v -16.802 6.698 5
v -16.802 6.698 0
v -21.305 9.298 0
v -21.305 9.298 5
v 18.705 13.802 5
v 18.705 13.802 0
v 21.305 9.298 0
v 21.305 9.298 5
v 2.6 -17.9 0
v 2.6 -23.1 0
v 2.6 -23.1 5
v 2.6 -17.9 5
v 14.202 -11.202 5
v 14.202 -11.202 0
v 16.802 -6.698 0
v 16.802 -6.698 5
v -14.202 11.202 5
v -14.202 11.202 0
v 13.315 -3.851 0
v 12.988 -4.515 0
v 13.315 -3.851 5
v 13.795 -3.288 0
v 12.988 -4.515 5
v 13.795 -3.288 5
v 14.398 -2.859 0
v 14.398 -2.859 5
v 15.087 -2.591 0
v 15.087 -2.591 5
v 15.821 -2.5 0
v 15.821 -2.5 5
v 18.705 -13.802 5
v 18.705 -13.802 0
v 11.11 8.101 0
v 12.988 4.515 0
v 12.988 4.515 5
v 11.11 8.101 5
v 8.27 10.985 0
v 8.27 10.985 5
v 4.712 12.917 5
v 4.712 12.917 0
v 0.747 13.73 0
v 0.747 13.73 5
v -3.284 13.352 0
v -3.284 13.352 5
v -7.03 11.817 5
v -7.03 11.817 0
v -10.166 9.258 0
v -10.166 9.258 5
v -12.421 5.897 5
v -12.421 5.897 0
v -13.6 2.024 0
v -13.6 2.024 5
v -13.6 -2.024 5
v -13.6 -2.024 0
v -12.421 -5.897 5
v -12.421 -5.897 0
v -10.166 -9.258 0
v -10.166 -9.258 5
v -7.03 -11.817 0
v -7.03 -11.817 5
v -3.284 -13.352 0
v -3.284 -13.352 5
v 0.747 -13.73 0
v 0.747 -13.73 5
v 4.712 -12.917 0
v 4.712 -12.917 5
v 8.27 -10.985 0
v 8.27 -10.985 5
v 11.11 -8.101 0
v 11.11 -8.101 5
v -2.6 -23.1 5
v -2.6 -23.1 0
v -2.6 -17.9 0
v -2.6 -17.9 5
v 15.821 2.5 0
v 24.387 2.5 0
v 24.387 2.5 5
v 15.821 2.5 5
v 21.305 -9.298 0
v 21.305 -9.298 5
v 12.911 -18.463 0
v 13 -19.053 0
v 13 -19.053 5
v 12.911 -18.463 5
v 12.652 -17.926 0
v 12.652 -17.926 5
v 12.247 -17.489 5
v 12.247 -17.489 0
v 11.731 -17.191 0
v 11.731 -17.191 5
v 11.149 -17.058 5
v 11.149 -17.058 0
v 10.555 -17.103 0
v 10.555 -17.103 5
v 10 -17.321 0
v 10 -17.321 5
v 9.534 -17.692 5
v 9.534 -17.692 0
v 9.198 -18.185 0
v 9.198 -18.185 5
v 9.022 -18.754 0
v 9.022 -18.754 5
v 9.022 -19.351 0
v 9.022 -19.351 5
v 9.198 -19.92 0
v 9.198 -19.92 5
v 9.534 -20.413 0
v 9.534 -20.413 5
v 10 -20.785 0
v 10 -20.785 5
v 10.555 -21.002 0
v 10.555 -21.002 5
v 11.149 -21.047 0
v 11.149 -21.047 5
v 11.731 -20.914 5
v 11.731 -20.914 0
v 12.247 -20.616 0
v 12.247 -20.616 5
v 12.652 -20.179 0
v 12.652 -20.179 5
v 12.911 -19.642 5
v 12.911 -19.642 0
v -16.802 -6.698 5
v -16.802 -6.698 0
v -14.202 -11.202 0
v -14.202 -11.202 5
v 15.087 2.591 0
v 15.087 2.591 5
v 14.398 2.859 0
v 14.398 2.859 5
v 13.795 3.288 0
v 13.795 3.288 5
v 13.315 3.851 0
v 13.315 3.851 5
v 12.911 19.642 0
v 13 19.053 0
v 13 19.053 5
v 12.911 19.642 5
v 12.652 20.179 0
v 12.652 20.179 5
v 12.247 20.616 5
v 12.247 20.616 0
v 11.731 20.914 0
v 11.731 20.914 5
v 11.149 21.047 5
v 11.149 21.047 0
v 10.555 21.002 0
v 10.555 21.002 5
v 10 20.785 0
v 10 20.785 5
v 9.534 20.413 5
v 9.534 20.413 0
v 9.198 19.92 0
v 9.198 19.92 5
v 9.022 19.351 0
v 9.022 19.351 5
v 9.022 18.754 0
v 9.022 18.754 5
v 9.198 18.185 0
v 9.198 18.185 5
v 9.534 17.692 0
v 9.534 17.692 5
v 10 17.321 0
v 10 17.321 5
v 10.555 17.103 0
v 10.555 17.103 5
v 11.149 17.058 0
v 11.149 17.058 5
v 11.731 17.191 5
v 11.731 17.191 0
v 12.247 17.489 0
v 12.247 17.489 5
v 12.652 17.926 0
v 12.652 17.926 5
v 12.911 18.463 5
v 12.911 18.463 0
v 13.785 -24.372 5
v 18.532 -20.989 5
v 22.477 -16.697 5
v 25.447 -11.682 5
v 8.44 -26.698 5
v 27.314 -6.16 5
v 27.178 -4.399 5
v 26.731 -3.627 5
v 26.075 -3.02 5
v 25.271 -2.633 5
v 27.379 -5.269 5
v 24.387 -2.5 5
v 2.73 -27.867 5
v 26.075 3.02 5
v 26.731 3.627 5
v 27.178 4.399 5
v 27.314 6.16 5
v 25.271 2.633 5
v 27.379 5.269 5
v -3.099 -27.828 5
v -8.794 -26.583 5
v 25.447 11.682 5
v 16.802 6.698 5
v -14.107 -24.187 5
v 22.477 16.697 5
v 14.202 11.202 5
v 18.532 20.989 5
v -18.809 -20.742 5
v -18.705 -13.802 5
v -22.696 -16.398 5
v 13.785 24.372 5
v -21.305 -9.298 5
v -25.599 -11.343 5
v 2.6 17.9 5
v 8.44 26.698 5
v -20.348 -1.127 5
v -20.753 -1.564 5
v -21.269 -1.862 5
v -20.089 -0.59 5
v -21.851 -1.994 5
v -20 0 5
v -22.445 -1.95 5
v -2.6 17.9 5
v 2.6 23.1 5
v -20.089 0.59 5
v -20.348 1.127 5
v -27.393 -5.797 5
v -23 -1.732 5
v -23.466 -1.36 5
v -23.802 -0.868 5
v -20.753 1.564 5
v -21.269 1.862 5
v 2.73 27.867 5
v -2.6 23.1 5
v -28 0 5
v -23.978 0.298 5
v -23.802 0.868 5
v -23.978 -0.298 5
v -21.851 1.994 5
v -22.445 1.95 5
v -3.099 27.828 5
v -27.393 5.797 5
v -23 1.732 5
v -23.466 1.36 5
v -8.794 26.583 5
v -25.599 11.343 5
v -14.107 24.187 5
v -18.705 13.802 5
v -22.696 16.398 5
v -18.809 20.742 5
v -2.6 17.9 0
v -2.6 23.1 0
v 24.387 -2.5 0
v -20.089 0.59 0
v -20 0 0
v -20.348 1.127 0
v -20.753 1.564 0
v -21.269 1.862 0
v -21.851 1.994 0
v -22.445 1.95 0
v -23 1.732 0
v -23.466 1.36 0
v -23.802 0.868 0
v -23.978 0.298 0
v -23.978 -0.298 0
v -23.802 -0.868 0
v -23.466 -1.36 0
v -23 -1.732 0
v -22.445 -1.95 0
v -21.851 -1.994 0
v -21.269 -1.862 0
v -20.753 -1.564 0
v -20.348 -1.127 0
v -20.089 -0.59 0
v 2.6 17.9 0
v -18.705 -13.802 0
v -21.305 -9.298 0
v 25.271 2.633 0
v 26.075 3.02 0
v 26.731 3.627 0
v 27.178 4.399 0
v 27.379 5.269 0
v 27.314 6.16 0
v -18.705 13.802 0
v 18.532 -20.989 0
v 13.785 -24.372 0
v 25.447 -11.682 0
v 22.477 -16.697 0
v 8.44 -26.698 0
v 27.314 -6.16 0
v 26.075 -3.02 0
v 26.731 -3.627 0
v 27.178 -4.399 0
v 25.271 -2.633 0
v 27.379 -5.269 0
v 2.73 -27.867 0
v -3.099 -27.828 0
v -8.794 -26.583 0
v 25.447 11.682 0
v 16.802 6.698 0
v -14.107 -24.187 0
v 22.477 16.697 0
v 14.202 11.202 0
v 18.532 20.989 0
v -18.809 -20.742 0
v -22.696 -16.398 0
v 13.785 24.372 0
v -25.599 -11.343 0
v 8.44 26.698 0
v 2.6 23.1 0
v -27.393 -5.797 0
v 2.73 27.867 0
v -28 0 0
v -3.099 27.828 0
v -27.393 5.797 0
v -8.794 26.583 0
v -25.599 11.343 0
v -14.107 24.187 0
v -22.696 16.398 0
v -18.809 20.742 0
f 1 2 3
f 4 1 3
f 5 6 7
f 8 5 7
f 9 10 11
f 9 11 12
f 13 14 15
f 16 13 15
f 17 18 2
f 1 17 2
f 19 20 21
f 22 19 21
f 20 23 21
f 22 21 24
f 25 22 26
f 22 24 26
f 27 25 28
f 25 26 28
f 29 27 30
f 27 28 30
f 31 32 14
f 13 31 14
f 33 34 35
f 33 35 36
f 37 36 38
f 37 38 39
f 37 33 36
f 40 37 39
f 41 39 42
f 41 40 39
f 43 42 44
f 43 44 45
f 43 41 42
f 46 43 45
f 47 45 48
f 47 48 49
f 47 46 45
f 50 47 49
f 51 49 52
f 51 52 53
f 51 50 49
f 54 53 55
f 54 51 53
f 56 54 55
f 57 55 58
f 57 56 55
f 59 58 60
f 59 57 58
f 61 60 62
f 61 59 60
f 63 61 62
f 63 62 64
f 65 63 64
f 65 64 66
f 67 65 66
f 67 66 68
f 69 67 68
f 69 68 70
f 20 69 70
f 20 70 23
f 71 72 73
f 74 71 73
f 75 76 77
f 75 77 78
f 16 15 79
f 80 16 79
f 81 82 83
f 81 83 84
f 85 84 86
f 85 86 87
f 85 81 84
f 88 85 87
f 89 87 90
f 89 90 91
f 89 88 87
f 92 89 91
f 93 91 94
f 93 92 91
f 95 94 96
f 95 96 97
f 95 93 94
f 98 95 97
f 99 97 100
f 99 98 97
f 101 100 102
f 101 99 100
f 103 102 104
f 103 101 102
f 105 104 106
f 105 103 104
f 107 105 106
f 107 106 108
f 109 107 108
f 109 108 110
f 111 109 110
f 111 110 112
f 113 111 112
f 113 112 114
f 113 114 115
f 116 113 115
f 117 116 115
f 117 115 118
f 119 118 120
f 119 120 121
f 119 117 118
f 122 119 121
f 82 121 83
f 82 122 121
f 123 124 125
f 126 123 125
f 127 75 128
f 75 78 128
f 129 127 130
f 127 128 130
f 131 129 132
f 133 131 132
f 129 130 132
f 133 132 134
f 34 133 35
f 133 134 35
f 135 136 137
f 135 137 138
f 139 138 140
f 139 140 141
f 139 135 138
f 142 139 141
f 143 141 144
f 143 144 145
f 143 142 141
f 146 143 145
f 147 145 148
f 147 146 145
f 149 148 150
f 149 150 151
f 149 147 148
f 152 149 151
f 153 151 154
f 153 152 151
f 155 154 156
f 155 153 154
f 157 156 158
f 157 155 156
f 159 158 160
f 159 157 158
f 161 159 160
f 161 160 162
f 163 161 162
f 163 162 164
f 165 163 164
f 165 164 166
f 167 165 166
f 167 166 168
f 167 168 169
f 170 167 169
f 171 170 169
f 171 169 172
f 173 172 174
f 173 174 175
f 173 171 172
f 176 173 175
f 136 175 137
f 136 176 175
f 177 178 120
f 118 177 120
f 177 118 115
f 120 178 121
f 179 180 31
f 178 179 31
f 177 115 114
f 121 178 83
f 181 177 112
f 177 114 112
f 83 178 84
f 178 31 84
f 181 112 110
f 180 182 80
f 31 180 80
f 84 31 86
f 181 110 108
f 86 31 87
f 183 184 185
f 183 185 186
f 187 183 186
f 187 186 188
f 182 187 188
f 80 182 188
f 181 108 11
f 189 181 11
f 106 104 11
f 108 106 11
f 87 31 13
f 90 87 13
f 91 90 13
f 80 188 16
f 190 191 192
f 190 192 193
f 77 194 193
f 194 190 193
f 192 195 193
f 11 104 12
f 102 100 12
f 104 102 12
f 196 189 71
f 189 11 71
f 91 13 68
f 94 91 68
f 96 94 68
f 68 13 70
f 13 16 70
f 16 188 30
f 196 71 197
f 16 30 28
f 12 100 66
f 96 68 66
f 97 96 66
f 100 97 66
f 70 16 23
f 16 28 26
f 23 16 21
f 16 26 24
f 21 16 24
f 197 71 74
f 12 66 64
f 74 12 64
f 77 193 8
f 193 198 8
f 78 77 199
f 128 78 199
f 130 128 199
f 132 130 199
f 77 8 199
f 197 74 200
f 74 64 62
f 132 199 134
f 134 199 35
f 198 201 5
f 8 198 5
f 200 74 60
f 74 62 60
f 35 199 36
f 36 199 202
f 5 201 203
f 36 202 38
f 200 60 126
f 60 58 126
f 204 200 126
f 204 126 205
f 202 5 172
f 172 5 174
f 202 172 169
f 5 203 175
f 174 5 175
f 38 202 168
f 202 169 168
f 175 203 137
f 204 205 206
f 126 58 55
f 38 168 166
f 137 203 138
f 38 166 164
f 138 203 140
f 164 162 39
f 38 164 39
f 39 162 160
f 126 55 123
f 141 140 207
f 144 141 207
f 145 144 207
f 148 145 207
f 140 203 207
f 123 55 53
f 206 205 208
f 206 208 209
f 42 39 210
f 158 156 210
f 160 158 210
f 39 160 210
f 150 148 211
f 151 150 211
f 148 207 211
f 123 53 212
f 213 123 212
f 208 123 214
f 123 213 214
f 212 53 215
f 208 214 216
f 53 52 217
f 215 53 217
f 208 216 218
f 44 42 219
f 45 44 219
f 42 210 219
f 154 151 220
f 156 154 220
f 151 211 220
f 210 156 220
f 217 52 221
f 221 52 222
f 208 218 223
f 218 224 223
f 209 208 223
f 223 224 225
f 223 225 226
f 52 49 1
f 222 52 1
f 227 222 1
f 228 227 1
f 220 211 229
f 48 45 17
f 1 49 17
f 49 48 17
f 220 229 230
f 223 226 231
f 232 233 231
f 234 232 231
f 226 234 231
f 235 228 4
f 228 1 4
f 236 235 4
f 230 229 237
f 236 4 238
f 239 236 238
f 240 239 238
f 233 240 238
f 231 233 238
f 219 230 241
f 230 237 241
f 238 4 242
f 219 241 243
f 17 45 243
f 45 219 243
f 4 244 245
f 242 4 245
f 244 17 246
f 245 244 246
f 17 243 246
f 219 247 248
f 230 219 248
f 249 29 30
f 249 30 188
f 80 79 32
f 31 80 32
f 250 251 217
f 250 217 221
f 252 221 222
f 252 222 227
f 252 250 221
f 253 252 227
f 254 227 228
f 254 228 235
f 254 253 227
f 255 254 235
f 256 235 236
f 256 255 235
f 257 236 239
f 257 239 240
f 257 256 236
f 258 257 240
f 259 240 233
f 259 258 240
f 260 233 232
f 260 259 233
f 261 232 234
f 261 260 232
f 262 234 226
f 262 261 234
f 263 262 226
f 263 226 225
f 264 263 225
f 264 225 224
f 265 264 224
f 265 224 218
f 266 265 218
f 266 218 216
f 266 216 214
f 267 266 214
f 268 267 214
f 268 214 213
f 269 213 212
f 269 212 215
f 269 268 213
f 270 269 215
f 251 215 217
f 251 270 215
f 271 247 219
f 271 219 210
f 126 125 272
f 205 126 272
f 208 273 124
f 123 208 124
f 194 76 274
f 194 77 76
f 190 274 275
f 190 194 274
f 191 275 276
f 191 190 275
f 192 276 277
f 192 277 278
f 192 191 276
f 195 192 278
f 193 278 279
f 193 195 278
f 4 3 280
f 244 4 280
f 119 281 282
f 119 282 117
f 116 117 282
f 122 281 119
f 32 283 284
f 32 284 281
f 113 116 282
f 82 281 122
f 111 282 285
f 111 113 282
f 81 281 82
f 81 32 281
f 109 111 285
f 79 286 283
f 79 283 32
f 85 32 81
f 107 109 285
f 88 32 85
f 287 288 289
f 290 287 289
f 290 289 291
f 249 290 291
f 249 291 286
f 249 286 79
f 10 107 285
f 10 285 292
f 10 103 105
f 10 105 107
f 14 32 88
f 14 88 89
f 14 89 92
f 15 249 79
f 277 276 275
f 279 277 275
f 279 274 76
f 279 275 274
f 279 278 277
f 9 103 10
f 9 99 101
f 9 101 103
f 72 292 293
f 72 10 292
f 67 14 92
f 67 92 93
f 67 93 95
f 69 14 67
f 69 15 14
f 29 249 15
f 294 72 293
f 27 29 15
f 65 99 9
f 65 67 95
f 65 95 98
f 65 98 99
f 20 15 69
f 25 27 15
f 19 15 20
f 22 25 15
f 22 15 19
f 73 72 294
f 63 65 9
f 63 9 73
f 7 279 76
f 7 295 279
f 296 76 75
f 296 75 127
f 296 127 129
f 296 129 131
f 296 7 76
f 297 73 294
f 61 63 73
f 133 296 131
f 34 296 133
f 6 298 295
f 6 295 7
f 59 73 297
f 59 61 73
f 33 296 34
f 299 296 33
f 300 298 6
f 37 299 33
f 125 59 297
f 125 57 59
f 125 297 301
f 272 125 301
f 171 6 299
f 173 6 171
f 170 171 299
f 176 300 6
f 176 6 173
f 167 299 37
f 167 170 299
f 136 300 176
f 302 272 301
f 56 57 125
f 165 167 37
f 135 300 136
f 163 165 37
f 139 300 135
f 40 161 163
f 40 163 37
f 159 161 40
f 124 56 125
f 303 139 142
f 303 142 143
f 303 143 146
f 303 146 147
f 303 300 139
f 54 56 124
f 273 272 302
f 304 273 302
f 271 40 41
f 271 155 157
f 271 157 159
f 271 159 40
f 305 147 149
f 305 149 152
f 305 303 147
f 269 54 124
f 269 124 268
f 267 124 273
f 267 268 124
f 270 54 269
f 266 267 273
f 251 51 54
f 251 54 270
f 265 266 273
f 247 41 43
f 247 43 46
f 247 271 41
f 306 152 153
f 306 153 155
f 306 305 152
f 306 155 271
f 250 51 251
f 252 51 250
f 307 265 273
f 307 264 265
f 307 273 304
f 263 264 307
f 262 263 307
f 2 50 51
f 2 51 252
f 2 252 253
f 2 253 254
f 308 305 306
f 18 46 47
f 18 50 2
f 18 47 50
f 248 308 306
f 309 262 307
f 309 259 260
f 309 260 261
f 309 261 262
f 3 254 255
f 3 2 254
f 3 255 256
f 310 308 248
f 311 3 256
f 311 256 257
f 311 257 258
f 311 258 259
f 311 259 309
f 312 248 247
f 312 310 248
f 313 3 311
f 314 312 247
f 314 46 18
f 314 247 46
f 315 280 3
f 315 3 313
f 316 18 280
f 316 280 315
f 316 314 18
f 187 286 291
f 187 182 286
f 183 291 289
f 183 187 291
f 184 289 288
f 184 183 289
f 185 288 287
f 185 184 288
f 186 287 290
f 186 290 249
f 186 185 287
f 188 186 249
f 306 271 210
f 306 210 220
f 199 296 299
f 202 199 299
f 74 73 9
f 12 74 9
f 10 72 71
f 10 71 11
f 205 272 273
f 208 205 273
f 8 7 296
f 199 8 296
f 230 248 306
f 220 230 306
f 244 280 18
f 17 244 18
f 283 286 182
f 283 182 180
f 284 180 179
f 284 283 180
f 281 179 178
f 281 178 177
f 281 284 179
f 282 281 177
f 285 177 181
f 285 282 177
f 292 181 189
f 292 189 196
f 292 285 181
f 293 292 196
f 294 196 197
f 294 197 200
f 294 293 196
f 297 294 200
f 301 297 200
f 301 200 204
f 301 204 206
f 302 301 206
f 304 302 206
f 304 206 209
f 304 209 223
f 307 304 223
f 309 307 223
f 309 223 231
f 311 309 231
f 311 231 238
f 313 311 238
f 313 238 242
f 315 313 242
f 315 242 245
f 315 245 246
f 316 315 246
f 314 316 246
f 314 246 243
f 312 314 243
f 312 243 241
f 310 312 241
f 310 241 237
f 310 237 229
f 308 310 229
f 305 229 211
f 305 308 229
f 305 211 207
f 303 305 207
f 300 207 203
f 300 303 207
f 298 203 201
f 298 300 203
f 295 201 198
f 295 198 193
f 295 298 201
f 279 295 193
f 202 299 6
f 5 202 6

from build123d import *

# Parameters (mm, degrees)
SKETCH1_R           = 2
SKETCH1_W           = 5.2
SKETCH1_H           = 5.2
BOSS_EXTRUDE1_DEPTH = 5
CONG_2_R            = 3


with BuildPart() as part:
    # Sketch1 → Boss-Extrude1 (new body)
    with BuildSketch(Plane.XY):
        with BuildLine():
            Line((27.888169535, 2.5), (13.520817283, 2.5))
            ThreePointArc((13.520817283, 2.5), (-13.75, 0), (13.520817283, -2.5))
            Line((13.520817283, -2.5), (27.888169535, -2.5))
            ThreePointArc((27.888169535, -2.5), (-28, 0), (27.888169535, 2.5))
        make_face()
        with Locations((11, 19.052558883)):
            Circle(SKETCH1_R, mode=Mode.SUBTRACT)
        with Locations((11, -19.052558883)):
            Circle(SKETCH1_R, mode=Mode.SUBTRACT)
        with Locations((-22, 0)):
            Circle(SKETCH1_R, mode=Mode.SUBTRACT)
        with Locations((0, 20.5)):
            Rectangle(SKETCH1_W, SKETCH1_H, mode=Mode.SUBTRACT)
        Polygon((21.305186827, 9.29833395), (16.801854728, 6.69833395), (14.201854728, 11.20166605), (18.705186827, 13.80166605), align=None, mode=Mode.SUBTRACT)
        Polygon((18.705186827, -13.80166605), (14.201854728, -11.20166605), (16.801854728, -6.69833395), (21.305186827, -9.29833395), align=None, mode=Mode.SUBTRACT)
        with Locations((0, -20.5)):
            Rectangle(SKETCH1_W, SKETCH1_H, mode=Mode.SUBTRACT)
        Polygon((-21.305186827, -9.29833395), (-16.801854728, -6.69833395), (-14.201854728, -11.20166605), (-18.705186827, -13.80166605), align=None, mode=Mode.SUBTRACT)
        Polygon((-18.705186827, 13.80166605), (-14.201854728, 11.20166605), (-16.801854728, 6.69833395), (-21.305186827, 9.29833395), align=None, mode=Mode.SUBTRACT)
    extrude(amount=BOSS_EXTRUDE1_DEPTH)

    # Congé2
    cong_2_edges = [part.edges().sort_by_distance(p)[0] for p in [
        (27.888169535, 2.5, 2.5),
        (13.520817283, 2.5, 2.5),
        (13.520817283, -2.5, 2.5),
        (27.888169535, -2.5, 2.5),
    ]]
    fillet(cong_2_edges, radius=CONG_2_R)


solid = part.part
